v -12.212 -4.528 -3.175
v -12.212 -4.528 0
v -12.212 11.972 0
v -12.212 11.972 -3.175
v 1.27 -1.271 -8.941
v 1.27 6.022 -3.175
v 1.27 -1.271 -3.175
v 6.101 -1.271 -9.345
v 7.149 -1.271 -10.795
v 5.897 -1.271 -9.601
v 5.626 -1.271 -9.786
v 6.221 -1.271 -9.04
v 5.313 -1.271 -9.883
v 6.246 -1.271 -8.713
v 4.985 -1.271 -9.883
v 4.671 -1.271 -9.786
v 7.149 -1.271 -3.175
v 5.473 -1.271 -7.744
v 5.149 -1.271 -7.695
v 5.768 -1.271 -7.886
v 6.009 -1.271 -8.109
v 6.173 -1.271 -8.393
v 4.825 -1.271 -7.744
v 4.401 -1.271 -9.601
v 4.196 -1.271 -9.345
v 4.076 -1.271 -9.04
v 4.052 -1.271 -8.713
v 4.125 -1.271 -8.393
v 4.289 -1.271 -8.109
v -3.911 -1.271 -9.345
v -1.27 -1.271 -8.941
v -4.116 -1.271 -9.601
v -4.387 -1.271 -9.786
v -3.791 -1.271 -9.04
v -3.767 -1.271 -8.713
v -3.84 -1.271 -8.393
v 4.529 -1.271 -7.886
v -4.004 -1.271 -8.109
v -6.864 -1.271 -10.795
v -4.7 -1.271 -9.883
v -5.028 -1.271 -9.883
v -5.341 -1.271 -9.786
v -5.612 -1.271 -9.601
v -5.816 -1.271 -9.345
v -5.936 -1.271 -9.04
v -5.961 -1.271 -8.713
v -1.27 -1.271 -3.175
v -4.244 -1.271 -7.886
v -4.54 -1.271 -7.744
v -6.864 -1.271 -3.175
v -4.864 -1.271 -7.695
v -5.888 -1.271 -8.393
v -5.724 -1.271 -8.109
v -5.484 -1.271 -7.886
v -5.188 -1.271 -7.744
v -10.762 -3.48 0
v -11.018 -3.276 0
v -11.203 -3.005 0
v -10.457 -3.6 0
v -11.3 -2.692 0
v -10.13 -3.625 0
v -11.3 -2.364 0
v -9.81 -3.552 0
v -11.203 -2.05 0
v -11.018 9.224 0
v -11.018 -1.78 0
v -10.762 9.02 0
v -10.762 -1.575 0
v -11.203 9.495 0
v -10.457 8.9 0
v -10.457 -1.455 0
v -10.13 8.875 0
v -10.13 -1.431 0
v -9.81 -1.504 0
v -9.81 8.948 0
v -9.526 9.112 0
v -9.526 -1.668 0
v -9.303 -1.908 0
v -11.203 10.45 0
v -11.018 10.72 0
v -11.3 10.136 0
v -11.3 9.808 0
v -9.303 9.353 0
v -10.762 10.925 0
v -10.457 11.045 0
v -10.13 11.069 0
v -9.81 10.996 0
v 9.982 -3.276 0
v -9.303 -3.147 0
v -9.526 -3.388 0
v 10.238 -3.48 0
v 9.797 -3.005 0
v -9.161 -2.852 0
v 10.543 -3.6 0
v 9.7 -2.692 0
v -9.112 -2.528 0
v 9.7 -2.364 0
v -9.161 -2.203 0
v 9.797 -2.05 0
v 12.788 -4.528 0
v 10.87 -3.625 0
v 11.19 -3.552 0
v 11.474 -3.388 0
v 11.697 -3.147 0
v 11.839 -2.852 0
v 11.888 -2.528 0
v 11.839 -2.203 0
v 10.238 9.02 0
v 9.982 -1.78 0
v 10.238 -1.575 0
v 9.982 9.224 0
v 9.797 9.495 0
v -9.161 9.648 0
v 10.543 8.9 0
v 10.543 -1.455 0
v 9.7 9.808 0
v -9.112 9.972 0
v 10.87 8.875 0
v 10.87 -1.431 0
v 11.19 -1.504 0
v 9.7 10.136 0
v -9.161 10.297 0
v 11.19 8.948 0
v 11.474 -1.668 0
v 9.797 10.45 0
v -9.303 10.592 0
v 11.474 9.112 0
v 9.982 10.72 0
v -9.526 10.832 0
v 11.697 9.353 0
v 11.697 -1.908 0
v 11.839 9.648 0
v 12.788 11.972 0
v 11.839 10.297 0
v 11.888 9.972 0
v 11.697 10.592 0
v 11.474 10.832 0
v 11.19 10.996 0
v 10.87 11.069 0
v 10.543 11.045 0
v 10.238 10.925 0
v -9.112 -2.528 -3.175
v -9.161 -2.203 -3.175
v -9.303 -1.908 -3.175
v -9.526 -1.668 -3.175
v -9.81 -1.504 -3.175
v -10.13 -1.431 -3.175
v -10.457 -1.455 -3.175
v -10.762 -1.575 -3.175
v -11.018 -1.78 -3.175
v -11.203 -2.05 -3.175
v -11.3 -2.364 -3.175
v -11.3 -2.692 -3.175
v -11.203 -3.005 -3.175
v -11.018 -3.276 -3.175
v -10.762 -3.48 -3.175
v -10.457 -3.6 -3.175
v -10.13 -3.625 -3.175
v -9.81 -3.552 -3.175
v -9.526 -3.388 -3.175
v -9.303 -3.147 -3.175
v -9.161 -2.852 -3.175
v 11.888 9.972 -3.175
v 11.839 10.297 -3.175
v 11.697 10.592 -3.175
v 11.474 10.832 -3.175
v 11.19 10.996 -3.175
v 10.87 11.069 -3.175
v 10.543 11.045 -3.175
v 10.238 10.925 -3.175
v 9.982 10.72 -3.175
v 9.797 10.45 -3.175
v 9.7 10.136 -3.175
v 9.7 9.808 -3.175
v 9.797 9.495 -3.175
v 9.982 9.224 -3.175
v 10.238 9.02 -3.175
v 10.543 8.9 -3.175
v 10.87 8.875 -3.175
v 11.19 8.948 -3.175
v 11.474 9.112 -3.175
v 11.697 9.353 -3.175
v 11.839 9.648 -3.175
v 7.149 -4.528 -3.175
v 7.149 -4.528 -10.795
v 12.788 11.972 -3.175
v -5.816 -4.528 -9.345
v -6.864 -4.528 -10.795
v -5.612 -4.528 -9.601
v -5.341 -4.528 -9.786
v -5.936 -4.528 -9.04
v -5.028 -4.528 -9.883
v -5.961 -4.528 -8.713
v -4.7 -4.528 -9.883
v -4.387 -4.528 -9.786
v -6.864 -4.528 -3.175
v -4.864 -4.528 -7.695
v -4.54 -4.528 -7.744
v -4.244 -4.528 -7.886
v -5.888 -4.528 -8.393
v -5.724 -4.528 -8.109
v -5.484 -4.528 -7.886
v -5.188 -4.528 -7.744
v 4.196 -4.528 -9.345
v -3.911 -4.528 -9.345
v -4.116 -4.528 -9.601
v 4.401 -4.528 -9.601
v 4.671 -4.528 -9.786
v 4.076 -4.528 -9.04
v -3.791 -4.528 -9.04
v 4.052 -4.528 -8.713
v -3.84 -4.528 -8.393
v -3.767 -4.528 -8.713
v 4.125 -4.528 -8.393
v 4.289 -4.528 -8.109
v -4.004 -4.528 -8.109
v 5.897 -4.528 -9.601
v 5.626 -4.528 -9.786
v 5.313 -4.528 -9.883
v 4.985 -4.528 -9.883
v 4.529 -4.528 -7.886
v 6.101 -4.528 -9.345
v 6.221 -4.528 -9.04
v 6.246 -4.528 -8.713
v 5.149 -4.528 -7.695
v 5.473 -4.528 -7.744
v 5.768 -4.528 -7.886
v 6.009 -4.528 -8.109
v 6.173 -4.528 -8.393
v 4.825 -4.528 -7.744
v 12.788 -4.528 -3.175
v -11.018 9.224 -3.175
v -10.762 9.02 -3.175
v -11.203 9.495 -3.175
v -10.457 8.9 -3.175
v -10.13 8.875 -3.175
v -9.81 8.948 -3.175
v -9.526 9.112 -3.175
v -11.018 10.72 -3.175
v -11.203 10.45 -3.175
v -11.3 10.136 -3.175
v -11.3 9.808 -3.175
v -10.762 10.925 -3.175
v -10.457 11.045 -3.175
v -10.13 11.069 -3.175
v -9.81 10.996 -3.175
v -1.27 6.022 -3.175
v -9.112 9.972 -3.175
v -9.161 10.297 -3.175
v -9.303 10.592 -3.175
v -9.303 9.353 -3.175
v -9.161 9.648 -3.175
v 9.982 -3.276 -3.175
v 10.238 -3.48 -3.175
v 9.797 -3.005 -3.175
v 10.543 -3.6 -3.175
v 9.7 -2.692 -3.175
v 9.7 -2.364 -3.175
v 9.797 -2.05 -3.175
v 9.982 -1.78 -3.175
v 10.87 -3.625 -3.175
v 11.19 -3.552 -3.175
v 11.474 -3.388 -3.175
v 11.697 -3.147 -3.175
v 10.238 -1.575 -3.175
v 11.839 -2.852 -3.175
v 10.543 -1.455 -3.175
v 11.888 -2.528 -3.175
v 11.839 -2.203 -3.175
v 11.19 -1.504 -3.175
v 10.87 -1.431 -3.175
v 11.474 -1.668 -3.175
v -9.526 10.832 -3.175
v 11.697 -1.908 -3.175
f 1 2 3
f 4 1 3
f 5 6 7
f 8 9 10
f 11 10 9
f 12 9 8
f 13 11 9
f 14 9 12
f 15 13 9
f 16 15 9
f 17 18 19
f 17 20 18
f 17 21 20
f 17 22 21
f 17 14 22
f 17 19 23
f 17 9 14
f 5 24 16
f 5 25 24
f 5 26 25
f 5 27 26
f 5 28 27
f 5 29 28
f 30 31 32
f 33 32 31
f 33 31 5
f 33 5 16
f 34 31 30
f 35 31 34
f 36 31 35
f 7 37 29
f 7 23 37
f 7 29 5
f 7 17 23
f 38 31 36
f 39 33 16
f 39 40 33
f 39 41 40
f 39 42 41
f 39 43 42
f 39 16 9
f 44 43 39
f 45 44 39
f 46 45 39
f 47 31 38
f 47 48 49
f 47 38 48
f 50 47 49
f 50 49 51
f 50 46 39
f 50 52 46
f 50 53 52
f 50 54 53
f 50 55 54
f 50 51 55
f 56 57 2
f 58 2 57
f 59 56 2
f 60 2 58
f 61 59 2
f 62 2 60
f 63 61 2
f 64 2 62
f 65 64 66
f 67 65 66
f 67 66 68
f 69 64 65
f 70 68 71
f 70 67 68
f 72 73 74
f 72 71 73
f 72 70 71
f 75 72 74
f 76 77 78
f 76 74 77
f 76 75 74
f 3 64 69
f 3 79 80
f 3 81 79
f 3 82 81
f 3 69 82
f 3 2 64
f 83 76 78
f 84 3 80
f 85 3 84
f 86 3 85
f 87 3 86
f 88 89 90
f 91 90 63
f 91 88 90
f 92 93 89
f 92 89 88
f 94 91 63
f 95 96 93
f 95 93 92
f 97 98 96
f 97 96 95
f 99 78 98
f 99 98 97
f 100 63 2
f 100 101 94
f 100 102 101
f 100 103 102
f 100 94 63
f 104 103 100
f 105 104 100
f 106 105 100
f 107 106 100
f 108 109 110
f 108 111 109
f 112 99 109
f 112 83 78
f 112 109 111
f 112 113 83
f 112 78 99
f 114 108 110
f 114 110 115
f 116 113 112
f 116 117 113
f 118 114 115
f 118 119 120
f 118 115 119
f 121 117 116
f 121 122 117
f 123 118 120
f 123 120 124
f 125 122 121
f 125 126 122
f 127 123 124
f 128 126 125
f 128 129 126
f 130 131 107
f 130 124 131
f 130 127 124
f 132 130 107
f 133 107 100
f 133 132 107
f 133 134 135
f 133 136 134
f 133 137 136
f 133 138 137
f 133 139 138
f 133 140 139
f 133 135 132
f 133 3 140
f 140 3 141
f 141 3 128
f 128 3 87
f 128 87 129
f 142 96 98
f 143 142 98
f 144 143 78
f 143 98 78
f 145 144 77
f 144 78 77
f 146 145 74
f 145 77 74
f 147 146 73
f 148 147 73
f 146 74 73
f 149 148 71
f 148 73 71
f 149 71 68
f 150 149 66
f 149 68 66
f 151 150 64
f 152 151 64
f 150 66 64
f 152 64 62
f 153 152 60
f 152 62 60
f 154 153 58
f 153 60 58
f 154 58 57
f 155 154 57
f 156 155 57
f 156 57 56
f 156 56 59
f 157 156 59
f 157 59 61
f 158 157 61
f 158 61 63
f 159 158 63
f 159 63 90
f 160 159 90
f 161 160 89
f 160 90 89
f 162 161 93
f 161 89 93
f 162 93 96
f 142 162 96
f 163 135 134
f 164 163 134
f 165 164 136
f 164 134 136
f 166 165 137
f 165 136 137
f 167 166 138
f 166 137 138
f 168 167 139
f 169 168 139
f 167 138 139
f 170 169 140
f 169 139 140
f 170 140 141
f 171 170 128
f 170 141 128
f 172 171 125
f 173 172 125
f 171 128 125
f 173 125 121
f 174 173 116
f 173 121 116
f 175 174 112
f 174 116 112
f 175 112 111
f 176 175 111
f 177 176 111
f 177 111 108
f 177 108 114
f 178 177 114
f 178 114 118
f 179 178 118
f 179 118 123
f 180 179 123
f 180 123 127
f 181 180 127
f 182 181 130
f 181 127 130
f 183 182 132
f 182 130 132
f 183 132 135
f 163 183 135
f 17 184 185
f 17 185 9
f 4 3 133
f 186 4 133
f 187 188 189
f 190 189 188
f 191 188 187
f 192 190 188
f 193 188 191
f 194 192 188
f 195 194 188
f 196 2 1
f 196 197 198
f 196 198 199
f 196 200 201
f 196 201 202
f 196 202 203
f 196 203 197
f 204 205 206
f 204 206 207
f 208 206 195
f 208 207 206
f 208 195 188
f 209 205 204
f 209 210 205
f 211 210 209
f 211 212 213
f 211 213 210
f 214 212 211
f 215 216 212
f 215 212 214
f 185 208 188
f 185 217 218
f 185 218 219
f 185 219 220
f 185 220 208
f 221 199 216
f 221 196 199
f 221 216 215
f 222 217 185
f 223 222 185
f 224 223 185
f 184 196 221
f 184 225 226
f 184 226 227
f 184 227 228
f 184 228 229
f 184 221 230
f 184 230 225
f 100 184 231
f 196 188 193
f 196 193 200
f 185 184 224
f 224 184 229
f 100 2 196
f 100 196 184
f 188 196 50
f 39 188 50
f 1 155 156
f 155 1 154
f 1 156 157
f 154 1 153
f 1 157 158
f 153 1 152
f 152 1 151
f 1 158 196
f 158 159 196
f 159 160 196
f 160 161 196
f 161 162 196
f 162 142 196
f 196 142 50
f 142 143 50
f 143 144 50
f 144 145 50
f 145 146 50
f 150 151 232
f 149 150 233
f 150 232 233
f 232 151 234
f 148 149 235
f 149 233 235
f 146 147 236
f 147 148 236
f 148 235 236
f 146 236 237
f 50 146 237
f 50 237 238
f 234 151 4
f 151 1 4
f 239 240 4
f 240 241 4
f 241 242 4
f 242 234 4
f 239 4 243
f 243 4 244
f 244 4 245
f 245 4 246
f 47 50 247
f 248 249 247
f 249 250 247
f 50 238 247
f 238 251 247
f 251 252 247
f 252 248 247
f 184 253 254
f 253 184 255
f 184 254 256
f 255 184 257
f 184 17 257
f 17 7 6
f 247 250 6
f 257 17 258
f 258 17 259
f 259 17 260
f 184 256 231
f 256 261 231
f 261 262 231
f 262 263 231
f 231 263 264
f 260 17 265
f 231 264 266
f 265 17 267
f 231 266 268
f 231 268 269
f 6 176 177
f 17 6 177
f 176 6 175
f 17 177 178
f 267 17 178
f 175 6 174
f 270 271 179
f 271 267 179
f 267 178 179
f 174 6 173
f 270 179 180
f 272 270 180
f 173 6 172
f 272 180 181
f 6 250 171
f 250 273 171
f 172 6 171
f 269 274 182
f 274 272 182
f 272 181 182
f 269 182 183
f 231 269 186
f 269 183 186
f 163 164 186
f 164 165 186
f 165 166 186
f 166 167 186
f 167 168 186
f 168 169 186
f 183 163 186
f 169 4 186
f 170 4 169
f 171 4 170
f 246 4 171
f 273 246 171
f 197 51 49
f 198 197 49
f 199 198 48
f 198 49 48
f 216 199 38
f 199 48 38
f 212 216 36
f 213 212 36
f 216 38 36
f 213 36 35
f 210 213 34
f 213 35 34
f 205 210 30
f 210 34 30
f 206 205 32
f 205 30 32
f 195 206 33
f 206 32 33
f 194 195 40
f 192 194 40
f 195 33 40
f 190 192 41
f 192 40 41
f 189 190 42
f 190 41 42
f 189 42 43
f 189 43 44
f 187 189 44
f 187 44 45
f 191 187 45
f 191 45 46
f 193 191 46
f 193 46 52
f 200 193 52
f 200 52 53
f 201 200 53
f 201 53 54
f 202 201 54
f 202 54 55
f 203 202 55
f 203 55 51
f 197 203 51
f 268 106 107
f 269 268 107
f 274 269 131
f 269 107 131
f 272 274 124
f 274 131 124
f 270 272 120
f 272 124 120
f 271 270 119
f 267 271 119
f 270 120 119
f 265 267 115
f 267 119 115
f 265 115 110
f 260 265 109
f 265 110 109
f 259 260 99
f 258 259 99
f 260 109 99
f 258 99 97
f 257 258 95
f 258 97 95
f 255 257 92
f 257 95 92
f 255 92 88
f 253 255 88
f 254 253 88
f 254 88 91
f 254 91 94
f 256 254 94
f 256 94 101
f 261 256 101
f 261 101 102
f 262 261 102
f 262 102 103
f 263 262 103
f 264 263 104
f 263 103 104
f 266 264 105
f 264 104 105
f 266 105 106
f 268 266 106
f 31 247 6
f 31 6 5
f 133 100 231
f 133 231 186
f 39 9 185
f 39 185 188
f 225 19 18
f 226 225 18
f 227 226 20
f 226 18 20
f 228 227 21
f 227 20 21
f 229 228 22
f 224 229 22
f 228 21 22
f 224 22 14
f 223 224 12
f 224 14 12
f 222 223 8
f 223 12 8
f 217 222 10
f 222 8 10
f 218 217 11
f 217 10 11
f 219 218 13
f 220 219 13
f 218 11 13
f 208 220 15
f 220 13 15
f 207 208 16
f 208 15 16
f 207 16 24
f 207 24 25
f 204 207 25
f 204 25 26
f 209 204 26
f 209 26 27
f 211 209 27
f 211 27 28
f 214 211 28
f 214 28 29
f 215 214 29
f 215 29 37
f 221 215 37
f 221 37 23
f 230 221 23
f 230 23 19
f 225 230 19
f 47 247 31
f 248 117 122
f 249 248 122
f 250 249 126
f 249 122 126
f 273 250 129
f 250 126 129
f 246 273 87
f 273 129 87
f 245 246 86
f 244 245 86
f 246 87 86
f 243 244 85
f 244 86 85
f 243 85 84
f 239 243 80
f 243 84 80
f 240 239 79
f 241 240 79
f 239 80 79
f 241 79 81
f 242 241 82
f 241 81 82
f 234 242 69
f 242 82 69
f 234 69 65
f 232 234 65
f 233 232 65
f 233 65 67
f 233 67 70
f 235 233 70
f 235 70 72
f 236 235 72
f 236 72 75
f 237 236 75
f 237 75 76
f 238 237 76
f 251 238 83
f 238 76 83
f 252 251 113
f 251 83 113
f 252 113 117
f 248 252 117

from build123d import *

# Parameters (mm, degrees)
SKETCH1_W           = 25
SKETCH1_H           = 16.5
SKETCH1_R           = 1.1
BOSS_EXTRUDE3_DEPTH = 3.175
SKETCH4_W           = 14.012619733
SKETCH4_H           = 3.256845332
BOSS_EXTRUDE4_DEPTH = 7.62
RIB13_REACH         = 22.577
SKETCH8_WALL_W      = 52.139653992
SKETCH8_WALL_H      = 2.54
SKETCH11_R          = 1.1
CUT_EXTRUDE3_DEPTH  = 22.341270784


with BuildPart() as part:
    # Sketch1 → Boss-Extrude3 (new body)
    with BuildSketch(Plane.XY):
        with Locations((0.288145608, 3.722304951)):
            Rectangle(SKETCH1_W, SKETCH1_H)
        with Locations((-10.211854392, 9.972304951)):
            Circle(SKETCH1_R, mode=Mode.SUBTRACT)
        with Locations((-10.211854392, -2.527695049)):
            Circle(SKETCH1_R, mode=Mode.SUBTRACT)
        with Locations((10.788145608, 9.972304951)):
            Circle(SKETCH1_R, mode=Mode.SUBTRACT)
        with Locations((10.788145608, -2.527695049)):
            Circle(SKETCH1_R, mode=Mode.SUBTRACT)
    extrude(amount=-BOSS_EXTRUDE3_DEPTH)

    # Sketch4 → Boss-Extrude4 (add)
    with BuildSketch(Plane(origin=(0, 0, -3.175), x_dir=(-1, 0, 0), z_dir=(0, 0, -1))):
        with Locations((-0.142456745, -2.899272383)):
            Rectangle(SKETCH4_W, SKETCH4_H)
    extrude(amount=BOSS_EXTRUDE4_DEPTH)

    # Sketch8 wall → Rib13 (add, up to next)
    with BuildSketch(Plane(origin=(0, 2.497441859, -5.961770268), x_dir=(0, -0.784409210178, -0.620243654533), z_dir=(0, 0.620243654533, -0.784409210178)), mode=Mode.PRIVATE) as rib13_sk1:
        Rectangle(SKETCH8_WALL_W, SKETCH8_WALL_H)
    rib13_tool1 = extrude(rib13_sk1.sketch, amount=-RIB13_REACH, mode=Mode.PRIVATE) - part.part
    add(rib13_tool1.solids().sort_by_distance((0, 2.497441859, -5.961770268))[0])

    # Sketch11 → Cut-Extrude3 (cut, through all)
    with BuildSketch(Plane(origin=(0, -1.270849717, 0), x_dir=(1, 0, 0), z_dir=(0, 1, 0))):
        with Locations(Location((-4.863853122, 8.795, 0), (0, 0, 270))):
            Circle(SKETCH11_R)
        with Locations(Location((5.148766611, 8.795, 0), (0, 0, 270))):
            Circle(SKETCH11_R)
    extrude(amount=-CUT_EXTRUDE3_DEPTH, mode=Mode.SUBTRACT)


solid = part.part
